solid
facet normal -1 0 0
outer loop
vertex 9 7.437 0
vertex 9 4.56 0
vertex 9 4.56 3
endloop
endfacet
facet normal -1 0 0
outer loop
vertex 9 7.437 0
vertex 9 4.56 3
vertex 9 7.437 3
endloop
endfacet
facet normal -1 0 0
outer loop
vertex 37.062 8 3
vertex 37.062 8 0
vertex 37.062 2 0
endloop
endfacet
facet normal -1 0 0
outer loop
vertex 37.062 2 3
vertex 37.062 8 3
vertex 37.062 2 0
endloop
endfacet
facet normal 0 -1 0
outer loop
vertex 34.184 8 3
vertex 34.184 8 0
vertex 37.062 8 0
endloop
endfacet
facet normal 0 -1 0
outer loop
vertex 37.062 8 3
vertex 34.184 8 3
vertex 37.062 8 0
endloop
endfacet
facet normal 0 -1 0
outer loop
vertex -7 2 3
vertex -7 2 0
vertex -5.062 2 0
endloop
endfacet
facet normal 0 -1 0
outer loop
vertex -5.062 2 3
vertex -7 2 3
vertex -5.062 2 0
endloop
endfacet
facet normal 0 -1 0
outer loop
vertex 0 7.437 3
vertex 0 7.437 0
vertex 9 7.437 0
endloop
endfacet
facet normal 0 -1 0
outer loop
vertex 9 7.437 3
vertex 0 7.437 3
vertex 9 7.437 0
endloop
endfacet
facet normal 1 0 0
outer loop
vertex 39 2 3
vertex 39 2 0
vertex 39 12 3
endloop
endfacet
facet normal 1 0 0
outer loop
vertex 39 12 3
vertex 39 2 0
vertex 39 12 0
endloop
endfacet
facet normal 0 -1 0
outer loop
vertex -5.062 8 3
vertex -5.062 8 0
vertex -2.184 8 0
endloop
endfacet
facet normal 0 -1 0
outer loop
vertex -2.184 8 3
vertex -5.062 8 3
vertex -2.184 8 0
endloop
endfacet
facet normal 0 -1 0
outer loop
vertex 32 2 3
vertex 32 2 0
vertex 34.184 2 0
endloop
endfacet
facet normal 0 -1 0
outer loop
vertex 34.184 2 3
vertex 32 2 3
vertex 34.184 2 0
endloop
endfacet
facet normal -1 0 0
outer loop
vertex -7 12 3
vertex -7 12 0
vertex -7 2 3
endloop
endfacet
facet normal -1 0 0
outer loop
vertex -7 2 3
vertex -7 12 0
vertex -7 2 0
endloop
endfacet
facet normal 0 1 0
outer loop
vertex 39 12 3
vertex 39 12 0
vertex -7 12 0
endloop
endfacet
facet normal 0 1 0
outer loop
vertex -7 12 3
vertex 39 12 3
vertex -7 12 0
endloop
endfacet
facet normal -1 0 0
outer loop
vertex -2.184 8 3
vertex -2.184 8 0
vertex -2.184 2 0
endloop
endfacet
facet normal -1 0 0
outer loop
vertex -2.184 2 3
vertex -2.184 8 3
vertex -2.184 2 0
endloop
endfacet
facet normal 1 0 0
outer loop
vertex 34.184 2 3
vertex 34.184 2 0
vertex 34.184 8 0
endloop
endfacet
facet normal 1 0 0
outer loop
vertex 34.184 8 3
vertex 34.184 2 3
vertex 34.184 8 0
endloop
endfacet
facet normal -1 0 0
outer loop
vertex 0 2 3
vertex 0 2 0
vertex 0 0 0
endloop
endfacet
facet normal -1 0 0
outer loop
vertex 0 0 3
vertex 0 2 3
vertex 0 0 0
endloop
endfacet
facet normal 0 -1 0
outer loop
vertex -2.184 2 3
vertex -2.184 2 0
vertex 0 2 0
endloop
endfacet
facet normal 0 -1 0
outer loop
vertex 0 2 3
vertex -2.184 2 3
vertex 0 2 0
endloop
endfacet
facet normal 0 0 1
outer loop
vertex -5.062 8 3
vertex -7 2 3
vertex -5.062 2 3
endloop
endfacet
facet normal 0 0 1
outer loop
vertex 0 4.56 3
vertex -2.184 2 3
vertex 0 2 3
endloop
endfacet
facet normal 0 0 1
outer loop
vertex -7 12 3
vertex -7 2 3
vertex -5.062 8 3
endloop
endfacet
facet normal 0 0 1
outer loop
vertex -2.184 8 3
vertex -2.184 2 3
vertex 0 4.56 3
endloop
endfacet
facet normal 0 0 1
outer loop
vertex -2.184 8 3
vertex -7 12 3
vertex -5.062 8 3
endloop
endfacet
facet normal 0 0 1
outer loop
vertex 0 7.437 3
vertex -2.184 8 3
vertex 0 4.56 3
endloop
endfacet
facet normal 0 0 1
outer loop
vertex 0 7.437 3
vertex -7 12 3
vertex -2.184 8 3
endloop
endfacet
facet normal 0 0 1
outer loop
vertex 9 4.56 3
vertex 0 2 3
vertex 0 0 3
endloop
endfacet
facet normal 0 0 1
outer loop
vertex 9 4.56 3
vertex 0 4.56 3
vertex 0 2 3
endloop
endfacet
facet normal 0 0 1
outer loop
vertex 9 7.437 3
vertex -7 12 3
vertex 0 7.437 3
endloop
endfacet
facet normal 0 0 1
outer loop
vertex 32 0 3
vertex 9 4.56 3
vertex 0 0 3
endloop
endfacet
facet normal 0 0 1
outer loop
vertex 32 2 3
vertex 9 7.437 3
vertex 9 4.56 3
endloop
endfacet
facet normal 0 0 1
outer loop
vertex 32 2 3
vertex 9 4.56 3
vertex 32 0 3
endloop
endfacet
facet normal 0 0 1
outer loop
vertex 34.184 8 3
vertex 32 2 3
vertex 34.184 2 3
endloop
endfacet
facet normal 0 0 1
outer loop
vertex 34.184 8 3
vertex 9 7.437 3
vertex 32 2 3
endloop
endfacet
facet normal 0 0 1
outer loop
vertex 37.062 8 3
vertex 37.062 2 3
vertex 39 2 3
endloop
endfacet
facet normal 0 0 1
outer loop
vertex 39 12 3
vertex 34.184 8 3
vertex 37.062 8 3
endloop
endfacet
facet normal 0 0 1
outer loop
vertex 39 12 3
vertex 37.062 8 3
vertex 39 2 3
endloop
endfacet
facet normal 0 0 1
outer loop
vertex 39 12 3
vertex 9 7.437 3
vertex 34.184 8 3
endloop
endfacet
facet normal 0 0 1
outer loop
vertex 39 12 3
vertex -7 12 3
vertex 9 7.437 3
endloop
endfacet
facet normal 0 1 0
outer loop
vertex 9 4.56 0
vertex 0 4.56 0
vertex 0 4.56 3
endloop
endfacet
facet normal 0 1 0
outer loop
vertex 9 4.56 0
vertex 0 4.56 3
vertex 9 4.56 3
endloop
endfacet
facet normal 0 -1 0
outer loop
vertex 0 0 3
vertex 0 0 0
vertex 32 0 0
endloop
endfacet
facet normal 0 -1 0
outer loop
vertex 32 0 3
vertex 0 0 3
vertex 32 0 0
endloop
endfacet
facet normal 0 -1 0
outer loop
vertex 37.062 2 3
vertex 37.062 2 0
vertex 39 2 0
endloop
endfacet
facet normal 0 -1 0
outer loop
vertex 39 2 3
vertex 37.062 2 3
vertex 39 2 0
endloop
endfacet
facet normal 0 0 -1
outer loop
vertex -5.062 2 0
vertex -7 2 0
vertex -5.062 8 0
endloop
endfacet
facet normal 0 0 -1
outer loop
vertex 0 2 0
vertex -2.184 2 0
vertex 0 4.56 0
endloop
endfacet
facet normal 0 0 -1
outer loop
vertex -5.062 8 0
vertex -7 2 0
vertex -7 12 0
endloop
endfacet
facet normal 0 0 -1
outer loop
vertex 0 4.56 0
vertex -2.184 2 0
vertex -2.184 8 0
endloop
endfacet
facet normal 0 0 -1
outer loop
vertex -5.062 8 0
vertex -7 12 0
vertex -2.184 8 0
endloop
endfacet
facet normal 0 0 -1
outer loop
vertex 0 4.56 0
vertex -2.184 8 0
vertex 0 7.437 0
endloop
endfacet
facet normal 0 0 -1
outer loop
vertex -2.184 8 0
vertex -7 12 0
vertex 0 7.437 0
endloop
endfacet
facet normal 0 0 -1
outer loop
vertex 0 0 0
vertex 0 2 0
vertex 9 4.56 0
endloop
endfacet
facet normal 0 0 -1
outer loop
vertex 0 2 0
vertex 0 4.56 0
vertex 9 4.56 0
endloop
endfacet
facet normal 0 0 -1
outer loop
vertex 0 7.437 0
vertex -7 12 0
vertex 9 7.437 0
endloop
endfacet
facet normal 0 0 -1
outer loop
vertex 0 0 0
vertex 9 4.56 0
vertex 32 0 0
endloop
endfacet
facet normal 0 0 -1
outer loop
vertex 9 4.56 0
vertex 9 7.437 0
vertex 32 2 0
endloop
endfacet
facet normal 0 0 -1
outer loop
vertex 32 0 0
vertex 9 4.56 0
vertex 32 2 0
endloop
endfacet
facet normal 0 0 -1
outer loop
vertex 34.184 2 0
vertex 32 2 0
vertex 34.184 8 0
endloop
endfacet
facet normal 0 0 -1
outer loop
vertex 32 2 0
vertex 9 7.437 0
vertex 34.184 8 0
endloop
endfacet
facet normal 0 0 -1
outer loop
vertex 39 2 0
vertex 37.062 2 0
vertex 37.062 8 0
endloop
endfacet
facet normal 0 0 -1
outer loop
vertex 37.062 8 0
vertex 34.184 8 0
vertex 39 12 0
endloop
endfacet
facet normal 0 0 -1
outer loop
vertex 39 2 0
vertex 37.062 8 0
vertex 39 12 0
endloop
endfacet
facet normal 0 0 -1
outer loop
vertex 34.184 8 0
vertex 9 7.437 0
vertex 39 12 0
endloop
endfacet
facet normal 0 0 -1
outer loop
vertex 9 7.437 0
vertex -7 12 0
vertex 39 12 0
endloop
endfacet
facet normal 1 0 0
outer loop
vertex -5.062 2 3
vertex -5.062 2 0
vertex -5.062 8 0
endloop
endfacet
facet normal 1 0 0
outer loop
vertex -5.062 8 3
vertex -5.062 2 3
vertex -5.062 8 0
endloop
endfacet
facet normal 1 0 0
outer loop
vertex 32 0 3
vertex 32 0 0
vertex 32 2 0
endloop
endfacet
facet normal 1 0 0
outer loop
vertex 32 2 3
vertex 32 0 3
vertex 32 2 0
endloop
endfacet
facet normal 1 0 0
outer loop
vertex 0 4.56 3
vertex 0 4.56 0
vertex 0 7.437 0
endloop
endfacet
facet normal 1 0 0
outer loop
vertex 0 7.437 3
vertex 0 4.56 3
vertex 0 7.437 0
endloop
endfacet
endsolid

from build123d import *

# Parameters (mm, degrees)
CROQUIS1_W              = 9
CROQUIS1_H              = 2.877
SALIENTE_EXTRUIR1_DEPTH = 3


with BuildPart() as part:
    # Croquis1 → Saliente-Extruir1 (new body)
    with BuildSketch(Plane.XY):
        Polygon((0, 2), (0, 0), (32, 0), (32, 2), (34.1845, 2), (34.1845, 8), (37.0615, 8), (37.0615, 2), (39, 2), (39, 12), (-7, 12), (-7, 2), (-5.0615, 2), (-5.0615, 8), (-2.1845, 8), (-2.1845, 2), align=None)
        with Locations((4.5, 5.9985)):
            Rectangle(CROQUIS1_W, CROQUIS1_H, mode=Mode.SUBTRACT)
    extrude(amount=SALIENTE_EXTRUIR1_DEPTH)


solid = part.part
